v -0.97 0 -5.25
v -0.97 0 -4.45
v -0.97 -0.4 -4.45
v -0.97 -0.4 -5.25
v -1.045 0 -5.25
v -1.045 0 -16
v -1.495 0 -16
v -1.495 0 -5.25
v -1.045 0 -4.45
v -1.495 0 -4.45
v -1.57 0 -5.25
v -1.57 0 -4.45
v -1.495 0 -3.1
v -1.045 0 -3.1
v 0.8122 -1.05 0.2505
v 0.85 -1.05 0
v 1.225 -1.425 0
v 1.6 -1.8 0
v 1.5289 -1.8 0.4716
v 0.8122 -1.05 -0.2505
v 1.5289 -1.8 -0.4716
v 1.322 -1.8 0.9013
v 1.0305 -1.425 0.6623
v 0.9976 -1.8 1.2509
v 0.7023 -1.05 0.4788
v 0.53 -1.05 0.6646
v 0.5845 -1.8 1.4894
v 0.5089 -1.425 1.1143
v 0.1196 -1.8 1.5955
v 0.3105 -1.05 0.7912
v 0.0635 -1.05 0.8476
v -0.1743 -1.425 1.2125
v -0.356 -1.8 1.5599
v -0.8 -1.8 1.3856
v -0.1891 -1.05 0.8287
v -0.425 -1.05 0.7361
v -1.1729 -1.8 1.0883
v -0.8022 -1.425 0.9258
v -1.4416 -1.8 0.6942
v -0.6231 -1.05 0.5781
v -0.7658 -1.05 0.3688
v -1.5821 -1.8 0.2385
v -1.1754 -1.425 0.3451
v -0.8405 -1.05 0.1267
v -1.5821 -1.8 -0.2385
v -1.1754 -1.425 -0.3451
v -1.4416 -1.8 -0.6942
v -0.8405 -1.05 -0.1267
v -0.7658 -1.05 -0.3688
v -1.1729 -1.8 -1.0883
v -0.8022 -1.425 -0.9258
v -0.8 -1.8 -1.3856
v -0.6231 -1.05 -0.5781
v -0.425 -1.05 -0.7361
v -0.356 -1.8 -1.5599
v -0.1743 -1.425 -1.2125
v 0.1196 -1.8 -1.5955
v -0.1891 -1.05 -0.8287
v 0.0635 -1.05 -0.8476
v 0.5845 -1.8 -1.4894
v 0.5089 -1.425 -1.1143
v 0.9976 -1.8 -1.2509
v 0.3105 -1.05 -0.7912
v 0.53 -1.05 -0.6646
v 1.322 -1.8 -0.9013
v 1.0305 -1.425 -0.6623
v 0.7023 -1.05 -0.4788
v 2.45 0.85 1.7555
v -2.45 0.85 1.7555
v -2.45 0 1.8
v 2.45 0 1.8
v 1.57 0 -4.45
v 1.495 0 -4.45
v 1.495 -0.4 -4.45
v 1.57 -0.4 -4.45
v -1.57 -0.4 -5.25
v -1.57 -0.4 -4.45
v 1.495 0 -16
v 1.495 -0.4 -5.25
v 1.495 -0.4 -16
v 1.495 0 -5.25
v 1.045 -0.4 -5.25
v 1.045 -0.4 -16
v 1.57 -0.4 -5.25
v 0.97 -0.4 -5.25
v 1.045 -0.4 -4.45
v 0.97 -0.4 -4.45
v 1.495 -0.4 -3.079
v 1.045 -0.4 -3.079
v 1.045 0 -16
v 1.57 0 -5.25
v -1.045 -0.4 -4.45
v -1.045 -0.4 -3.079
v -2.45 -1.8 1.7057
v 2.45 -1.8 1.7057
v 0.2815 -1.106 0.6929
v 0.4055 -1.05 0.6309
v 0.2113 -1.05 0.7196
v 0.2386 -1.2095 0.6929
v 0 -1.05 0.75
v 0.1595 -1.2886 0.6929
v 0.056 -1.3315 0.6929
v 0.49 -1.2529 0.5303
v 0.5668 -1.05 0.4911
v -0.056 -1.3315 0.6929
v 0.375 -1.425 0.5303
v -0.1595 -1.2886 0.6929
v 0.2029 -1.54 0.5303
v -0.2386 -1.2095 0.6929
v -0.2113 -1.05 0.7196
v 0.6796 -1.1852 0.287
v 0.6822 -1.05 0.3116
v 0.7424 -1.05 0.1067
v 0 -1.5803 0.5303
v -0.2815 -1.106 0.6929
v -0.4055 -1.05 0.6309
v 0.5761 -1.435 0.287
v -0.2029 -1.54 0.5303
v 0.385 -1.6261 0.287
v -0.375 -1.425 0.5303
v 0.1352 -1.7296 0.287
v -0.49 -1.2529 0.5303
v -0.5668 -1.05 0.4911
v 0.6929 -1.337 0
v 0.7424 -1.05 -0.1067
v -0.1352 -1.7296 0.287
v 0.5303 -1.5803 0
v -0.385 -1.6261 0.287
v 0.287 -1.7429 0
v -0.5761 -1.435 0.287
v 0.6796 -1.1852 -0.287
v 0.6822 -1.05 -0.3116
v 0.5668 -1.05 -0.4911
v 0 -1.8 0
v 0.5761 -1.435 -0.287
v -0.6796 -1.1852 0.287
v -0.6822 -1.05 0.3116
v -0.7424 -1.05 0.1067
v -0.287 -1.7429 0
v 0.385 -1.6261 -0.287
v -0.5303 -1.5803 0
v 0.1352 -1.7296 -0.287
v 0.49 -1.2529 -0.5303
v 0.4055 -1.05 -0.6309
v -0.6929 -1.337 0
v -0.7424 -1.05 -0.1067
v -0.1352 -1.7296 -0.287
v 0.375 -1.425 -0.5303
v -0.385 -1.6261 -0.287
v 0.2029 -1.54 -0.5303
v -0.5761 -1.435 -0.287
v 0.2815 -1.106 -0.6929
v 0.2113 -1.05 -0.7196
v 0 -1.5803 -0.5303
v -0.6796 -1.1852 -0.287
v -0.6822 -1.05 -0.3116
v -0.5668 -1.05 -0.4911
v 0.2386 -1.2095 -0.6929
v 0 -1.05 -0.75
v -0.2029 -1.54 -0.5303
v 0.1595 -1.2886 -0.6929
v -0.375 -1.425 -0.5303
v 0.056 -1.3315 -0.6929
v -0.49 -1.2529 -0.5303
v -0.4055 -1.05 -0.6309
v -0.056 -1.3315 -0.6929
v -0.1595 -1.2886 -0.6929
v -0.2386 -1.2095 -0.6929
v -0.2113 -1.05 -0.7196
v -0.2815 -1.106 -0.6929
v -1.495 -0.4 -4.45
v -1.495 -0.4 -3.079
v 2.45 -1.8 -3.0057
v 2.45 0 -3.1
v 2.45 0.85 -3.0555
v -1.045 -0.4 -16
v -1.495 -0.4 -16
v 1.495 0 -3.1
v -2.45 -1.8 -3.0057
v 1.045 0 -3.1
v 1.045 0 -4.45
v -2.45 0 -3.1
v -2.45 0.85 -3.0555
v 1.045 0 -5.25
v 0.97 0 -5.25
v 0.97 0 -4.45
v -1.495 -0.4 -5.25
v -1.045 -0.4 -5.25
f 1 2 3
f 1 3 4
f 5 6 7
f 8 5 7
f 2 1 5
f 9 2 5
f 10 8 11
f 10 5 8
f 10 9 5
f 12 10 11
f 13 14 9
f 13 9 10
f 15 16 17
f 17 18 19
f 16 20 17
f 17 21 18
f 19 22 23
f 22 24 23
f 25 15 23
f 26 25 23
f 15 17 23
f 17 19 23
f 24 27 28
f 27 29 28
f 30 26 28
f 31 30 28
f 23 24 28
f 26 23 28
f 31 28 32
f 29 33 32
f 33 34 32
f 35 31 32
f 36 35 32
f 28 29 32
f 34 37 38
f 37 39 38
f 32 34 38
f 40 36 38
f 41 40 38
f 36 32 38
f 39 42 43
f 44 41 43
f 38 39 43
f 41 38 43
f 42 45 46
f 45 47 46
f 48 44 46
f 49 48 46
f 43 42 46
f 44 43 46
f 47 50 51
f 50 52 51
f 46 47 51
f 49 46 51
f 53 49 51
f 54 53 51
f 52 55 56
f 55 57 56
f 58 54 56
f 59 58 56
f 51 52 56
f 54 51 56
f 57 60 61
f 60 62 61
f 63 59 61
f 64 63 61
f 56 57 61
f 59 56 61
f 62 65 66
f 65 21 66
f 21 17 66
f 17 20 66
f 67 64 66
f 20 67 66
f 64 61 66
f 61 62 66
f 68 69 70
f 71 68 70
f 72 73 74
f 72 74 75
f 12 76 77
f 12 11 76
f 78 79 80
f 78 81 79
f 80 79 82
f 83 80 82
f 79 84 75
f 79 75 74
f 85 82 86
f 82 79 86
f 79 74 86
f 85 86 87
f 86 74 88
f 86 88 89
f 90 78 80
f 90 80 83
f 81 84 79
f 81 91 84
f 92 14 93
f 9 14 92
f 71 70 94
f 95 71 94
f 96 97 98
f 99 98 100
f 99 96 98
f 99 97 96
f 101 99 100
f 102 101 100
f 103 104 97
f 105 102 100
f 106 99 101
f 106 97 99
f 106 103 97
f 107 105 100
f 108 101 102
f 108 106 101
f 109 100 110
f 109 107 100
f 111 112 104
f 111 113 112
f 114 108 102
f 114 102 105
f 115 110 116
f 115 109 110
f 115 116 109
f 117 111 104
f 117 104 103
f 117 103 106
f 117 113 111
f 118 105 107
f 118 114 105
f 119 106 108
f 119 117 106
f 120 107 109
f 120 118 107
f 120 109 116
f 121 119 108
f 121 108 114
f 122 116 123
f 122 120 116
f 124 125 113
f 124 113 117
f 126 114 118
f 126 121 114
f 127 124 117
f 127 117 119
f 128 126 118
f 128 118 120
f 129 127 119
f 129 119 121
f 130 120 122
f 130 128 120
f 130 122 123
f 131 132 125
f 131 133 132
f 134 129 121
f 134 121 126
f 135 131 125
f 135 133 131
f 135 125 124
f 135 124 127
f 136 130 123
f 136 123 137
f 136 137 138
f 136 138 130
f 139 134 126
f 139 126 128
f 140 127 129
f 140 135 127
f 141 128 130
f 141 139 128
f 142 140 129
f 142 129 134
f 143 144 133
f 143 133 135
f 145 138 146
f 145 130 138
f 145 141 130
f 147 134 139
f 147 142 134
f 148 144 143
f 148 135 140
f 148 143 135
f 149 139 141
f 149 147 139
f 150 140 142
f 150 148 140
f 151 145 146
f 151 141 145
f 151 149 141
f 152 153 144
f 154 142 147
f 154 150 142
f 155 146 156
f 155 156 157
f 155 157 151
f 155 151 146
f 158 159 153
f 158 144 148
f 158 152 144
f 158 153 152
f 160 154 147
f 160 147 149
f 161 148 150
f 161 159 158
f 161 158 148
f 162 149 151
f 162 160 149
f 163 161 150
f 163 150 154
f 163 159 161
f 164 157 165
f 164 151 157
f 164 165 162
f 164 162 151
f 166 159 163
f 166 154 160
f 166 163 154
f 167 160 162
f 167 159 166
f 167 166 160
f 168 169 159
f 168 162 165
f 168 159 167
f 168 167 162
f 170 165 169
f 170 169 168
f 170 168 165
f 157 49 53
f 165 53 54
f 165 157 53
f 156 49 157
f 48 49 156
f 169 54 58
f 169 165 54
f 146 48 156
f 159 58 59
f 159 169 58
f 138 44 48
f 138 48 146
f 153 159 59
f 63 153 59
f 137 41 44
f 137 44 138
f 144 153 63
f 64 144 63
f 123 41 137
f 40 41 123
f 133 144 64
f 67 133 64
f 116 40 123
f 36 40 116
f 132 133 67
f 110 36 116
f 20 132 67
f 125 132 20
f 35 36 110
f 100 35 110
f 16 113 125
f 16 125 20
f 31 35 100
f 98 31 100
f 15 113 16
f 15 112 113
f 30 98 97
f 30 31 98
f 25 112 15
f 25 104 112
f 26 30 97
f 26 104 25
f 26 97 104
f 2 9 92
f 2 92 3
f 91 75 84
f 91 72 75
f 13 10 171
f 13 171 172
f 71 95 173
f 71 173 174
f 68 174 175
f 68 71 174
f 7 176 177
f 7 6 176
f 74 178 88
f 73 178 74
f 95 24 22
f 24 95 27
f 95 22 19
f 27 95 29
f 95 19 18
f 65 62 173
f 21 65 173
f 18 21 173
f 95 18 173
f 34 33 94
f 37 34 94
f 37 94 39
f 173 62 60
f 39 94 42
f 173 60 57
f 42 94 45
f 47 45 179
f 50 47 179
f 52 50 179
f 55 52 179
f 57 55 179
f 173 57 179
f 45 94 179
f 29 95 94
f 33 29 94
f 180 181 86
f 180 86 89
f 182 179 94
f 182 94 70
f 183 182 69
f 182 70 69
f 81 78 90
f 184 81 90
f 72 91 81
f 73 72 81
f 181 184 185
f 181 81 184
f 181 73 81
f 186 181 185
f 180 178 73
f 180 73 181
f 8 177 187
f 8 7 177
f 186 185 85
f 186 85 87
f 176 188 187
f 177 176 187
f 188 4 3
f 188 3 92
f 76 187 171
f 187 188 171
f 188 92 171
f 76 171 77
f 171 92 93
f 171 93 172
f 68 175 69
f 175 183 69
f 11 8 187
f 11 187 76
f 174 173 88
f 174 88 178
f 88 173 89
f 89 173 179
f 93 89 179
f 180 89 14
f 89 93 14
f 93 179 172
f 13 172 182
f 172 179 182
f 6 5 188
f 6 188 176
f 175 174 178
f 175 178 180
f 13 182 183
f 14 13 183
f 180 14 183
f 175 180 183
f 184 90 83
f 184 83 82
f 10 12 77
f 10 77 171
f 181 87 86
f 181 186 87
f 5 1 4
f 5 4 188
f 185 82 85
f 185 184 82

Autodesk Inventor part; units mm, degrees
ref_plane "YZ Plane" through (0, 0, 0) normal (1, 0, 0) x (0, 1, 0)
ref_plane "XZ Plane" through (0, 0, 0) normal (0, 1, 0) x (-1, 0, 0)
ref_plane "XY Plane" through (0, 0, 0) normal (0, 0, 1) x (1, 0, 0)
sketch "Skizze1" plane through (0, 0, 0) normal (1, 0, 0) x (0, 1, 0)
  line L0 (0.85, 1.755453) -> (0, 1.8)
  line L1 (0, 1.8) -> (-1.8, 1.705666)
  line L2 (-1.8, 1.705666) -> (-1.8, -3.005666)
  line L3 (-1.8, -3.005666) -> (0, -3.1)
  line L4 (0, -3.1) -> (0.85, -3.055453)
  line L5 (0.85, -3.055453) -> (0.85, 1.755453)
  line L6 (0, 2.78) -> (0, -4.08)
  line L7 (-2.33, 0) -> (1.38, 0)
  point P0 (0, 0)
  dimension "d0" = 2.65
  dimension "d1" = 4.9
  dimension "d2" = 3.1
  dimension "d3" = 3
  dimension "d4" = 3
  dimension "d5" = 3
  dimension "d6" = 3
  dimension "d7" = 1.8
sketch "Skizze1 outline for Extrusion1" plane through (0, 0, 0) normal (1, 0, 0) x (0, 1, 0)
  line L0 (0.85, 1.755453) -> (0, 1.8)
  line L1 (0, 1.8) -> (-1.8, 1.705666)
  line L2 (-1.8, 1.705666) -> (-1.8, -3.005666)
  line L3 (-1.8, -3.005666) -> (0, -3.1)
  line L4 (0, -3.1) -> (0.85, -3.055453)
  line L5 (0.85, -3.055453) -> (0.85, 1.755453)
extrude "Extrusion1" add sketch "Skizze1 outline for Extrusion1" along normal mid plane 4.9
sketch "Skizze2" plane through (0, 0, 0) normal (0, 1, 0) x (-1, 0, 0)
  line L0 (2.45, -3.1) -> (-2.45, -3.1)
  line L1 (1.495, -2.1) -> (1.045, -2.1)
  line L2 (1.045, -16) -> (1.495, -16)
  line L3 (0.97, -4.45) -> (0.97, -5.25)
  line L4 (1.57, -5.25) -> (1.57, -4.45)
  line L5 (1.57, -4.45) -> (1.495, -4.45)
  line L6 (1.045, -4.45) -> (0.97, -4.45)
  line L7 (1.495, -16) -> (1.495, -5.25)
  line L8 (1.495, -4.45) -> (1.495, -2.1)
  line L9 (1.045, -2.1) -> (1.045, -4.45)
  line L10 (1.045, -5.25) -> (1.045, -16)
  line L11 (0.97, -5.25) -> (1.045, -5.25)
  line L12 (1.495, -5.25) -> (1.57, -5.25)
  line L13 (1.27, -16) -> (1.27, -2.1) construction
  line L14 (2.45, 1.8) -> (-2.45, 1.8) construction
  line L15 (-2.45, 1.755453) -> (-2.45, 1.8) construction
  line L16 (2.45, 1.755453) -> (-2.45, 1.755453) construction
  line L17 (2.45, 1.8) -> (2.45, 1.755453) construction
  point P0 (0, 0)
  dimension "d10" = 0.45
  dimension "d11" = 0.6
  dimension "d12" = 0.8
  dimension "d13" = 2.15
  dimension "d14" = 1.27
  dimension "d15" = 17.8
  dimension "d16" = 1
sketch "Skizze2 outline for Extrusion2" plane through (0, 0, 0) normal (0, 1, 0) x (-1, 0, 0)
  line L0 (1.495, -4.45) -> (1.495, -2.1)
  line L1 (1.57, -4.45) -> (1.495, -4.45)
  line L2 (1.57, -5.25) -> (1.57, -4.45)
  line L3 (1.495, -5.25) -> (1.57, -5.25)
  line L4 (1.495, -16) -> (1.495, -5.25)
  line L5 (1.045, -16) -> (1.495, -16)
  line L6 (1.045, -5.25) -> (1.045, -16)
  line L7 (0.97, -5.25) -> (1.045, -5.25)
  line L8 (0.97, -4.45) -> (0.97, -5.25)
  line L9 (1.045, -4.45) -> (0.97, -4.45)
  line L10 (1.045, -2.1) -> (1.045, -4.45)
  line L11 (1.495, -2.1) -> (1.045, -2.1)
extrude "Extrusion2" add sketch "Skizze2 outline for Extrusion2" against normal blind 0.4
mirror "Spiegeln1" about plane through (0, 0, 0) normal (1, 0, 0) of "Extrusion2"
sketch "Skizze3" plane through (-2.45, -1.8, -3.005666) normal (0, -1, 0) x (1, 0, 0)
  line L0 (2.45, 5.785666) -> (2.45, -1.074334)
  line L1 (-0.98, 3.005666) -> (5.88, 3.005666)
  circle A0 centre (2.45, 3.005666) radius 1.6
  dimension "d19" = 3.2
sketch "Skizze3 outline for Extrusion3" plane through (-2.45, -1.8, -3.005666) normal (0, -1, 0) x (1, 0, 0)
  circle A0 centre (2.45, 3.005666) radius 1.6
extrude "Extrusion3" cut sketch "Skizze3 outline for Extrusion3" against normal blind 0.75 draft -45
sketch "Skizze4" plane through (0, 0, 0) normal (1, 0, 0) x (0, 1, 0)
  line L0 (-1.05, 0.85) -> (-1.05, -0.85)
  arc A0 (-1.05, 0.75) -> (-1.05, -0.75) centre (-1.05, 0) ccw
  line L1 (-2.371105, 0) -> (1.386851, 0)
  line L2 (-1.05, 0.75) -> (-1.05, -0.75)
  point P0 (0, 0)
  dimension "d22" = 0.75
sketch "Skizze4 outline for Umdrehung1" plane through (0, 0, 0) normal (1, 0, 0) x (0, 1, 0)
  line L0 (-1.05, -0.75) -> (-1.05, 0.75)
  arc A0 (-1.05, 0.75) -> (-1.05, -0.75) centre (-1.05, 0) ccw
revolve "Umdrehung1" add sketch "Skizze4 outline for Umdrehung1" angle 180 mid plane about axis through (0, -1.05, 0.75) along (0, 0, -1)
properties part number "IR Emitter TSKS5400S"
